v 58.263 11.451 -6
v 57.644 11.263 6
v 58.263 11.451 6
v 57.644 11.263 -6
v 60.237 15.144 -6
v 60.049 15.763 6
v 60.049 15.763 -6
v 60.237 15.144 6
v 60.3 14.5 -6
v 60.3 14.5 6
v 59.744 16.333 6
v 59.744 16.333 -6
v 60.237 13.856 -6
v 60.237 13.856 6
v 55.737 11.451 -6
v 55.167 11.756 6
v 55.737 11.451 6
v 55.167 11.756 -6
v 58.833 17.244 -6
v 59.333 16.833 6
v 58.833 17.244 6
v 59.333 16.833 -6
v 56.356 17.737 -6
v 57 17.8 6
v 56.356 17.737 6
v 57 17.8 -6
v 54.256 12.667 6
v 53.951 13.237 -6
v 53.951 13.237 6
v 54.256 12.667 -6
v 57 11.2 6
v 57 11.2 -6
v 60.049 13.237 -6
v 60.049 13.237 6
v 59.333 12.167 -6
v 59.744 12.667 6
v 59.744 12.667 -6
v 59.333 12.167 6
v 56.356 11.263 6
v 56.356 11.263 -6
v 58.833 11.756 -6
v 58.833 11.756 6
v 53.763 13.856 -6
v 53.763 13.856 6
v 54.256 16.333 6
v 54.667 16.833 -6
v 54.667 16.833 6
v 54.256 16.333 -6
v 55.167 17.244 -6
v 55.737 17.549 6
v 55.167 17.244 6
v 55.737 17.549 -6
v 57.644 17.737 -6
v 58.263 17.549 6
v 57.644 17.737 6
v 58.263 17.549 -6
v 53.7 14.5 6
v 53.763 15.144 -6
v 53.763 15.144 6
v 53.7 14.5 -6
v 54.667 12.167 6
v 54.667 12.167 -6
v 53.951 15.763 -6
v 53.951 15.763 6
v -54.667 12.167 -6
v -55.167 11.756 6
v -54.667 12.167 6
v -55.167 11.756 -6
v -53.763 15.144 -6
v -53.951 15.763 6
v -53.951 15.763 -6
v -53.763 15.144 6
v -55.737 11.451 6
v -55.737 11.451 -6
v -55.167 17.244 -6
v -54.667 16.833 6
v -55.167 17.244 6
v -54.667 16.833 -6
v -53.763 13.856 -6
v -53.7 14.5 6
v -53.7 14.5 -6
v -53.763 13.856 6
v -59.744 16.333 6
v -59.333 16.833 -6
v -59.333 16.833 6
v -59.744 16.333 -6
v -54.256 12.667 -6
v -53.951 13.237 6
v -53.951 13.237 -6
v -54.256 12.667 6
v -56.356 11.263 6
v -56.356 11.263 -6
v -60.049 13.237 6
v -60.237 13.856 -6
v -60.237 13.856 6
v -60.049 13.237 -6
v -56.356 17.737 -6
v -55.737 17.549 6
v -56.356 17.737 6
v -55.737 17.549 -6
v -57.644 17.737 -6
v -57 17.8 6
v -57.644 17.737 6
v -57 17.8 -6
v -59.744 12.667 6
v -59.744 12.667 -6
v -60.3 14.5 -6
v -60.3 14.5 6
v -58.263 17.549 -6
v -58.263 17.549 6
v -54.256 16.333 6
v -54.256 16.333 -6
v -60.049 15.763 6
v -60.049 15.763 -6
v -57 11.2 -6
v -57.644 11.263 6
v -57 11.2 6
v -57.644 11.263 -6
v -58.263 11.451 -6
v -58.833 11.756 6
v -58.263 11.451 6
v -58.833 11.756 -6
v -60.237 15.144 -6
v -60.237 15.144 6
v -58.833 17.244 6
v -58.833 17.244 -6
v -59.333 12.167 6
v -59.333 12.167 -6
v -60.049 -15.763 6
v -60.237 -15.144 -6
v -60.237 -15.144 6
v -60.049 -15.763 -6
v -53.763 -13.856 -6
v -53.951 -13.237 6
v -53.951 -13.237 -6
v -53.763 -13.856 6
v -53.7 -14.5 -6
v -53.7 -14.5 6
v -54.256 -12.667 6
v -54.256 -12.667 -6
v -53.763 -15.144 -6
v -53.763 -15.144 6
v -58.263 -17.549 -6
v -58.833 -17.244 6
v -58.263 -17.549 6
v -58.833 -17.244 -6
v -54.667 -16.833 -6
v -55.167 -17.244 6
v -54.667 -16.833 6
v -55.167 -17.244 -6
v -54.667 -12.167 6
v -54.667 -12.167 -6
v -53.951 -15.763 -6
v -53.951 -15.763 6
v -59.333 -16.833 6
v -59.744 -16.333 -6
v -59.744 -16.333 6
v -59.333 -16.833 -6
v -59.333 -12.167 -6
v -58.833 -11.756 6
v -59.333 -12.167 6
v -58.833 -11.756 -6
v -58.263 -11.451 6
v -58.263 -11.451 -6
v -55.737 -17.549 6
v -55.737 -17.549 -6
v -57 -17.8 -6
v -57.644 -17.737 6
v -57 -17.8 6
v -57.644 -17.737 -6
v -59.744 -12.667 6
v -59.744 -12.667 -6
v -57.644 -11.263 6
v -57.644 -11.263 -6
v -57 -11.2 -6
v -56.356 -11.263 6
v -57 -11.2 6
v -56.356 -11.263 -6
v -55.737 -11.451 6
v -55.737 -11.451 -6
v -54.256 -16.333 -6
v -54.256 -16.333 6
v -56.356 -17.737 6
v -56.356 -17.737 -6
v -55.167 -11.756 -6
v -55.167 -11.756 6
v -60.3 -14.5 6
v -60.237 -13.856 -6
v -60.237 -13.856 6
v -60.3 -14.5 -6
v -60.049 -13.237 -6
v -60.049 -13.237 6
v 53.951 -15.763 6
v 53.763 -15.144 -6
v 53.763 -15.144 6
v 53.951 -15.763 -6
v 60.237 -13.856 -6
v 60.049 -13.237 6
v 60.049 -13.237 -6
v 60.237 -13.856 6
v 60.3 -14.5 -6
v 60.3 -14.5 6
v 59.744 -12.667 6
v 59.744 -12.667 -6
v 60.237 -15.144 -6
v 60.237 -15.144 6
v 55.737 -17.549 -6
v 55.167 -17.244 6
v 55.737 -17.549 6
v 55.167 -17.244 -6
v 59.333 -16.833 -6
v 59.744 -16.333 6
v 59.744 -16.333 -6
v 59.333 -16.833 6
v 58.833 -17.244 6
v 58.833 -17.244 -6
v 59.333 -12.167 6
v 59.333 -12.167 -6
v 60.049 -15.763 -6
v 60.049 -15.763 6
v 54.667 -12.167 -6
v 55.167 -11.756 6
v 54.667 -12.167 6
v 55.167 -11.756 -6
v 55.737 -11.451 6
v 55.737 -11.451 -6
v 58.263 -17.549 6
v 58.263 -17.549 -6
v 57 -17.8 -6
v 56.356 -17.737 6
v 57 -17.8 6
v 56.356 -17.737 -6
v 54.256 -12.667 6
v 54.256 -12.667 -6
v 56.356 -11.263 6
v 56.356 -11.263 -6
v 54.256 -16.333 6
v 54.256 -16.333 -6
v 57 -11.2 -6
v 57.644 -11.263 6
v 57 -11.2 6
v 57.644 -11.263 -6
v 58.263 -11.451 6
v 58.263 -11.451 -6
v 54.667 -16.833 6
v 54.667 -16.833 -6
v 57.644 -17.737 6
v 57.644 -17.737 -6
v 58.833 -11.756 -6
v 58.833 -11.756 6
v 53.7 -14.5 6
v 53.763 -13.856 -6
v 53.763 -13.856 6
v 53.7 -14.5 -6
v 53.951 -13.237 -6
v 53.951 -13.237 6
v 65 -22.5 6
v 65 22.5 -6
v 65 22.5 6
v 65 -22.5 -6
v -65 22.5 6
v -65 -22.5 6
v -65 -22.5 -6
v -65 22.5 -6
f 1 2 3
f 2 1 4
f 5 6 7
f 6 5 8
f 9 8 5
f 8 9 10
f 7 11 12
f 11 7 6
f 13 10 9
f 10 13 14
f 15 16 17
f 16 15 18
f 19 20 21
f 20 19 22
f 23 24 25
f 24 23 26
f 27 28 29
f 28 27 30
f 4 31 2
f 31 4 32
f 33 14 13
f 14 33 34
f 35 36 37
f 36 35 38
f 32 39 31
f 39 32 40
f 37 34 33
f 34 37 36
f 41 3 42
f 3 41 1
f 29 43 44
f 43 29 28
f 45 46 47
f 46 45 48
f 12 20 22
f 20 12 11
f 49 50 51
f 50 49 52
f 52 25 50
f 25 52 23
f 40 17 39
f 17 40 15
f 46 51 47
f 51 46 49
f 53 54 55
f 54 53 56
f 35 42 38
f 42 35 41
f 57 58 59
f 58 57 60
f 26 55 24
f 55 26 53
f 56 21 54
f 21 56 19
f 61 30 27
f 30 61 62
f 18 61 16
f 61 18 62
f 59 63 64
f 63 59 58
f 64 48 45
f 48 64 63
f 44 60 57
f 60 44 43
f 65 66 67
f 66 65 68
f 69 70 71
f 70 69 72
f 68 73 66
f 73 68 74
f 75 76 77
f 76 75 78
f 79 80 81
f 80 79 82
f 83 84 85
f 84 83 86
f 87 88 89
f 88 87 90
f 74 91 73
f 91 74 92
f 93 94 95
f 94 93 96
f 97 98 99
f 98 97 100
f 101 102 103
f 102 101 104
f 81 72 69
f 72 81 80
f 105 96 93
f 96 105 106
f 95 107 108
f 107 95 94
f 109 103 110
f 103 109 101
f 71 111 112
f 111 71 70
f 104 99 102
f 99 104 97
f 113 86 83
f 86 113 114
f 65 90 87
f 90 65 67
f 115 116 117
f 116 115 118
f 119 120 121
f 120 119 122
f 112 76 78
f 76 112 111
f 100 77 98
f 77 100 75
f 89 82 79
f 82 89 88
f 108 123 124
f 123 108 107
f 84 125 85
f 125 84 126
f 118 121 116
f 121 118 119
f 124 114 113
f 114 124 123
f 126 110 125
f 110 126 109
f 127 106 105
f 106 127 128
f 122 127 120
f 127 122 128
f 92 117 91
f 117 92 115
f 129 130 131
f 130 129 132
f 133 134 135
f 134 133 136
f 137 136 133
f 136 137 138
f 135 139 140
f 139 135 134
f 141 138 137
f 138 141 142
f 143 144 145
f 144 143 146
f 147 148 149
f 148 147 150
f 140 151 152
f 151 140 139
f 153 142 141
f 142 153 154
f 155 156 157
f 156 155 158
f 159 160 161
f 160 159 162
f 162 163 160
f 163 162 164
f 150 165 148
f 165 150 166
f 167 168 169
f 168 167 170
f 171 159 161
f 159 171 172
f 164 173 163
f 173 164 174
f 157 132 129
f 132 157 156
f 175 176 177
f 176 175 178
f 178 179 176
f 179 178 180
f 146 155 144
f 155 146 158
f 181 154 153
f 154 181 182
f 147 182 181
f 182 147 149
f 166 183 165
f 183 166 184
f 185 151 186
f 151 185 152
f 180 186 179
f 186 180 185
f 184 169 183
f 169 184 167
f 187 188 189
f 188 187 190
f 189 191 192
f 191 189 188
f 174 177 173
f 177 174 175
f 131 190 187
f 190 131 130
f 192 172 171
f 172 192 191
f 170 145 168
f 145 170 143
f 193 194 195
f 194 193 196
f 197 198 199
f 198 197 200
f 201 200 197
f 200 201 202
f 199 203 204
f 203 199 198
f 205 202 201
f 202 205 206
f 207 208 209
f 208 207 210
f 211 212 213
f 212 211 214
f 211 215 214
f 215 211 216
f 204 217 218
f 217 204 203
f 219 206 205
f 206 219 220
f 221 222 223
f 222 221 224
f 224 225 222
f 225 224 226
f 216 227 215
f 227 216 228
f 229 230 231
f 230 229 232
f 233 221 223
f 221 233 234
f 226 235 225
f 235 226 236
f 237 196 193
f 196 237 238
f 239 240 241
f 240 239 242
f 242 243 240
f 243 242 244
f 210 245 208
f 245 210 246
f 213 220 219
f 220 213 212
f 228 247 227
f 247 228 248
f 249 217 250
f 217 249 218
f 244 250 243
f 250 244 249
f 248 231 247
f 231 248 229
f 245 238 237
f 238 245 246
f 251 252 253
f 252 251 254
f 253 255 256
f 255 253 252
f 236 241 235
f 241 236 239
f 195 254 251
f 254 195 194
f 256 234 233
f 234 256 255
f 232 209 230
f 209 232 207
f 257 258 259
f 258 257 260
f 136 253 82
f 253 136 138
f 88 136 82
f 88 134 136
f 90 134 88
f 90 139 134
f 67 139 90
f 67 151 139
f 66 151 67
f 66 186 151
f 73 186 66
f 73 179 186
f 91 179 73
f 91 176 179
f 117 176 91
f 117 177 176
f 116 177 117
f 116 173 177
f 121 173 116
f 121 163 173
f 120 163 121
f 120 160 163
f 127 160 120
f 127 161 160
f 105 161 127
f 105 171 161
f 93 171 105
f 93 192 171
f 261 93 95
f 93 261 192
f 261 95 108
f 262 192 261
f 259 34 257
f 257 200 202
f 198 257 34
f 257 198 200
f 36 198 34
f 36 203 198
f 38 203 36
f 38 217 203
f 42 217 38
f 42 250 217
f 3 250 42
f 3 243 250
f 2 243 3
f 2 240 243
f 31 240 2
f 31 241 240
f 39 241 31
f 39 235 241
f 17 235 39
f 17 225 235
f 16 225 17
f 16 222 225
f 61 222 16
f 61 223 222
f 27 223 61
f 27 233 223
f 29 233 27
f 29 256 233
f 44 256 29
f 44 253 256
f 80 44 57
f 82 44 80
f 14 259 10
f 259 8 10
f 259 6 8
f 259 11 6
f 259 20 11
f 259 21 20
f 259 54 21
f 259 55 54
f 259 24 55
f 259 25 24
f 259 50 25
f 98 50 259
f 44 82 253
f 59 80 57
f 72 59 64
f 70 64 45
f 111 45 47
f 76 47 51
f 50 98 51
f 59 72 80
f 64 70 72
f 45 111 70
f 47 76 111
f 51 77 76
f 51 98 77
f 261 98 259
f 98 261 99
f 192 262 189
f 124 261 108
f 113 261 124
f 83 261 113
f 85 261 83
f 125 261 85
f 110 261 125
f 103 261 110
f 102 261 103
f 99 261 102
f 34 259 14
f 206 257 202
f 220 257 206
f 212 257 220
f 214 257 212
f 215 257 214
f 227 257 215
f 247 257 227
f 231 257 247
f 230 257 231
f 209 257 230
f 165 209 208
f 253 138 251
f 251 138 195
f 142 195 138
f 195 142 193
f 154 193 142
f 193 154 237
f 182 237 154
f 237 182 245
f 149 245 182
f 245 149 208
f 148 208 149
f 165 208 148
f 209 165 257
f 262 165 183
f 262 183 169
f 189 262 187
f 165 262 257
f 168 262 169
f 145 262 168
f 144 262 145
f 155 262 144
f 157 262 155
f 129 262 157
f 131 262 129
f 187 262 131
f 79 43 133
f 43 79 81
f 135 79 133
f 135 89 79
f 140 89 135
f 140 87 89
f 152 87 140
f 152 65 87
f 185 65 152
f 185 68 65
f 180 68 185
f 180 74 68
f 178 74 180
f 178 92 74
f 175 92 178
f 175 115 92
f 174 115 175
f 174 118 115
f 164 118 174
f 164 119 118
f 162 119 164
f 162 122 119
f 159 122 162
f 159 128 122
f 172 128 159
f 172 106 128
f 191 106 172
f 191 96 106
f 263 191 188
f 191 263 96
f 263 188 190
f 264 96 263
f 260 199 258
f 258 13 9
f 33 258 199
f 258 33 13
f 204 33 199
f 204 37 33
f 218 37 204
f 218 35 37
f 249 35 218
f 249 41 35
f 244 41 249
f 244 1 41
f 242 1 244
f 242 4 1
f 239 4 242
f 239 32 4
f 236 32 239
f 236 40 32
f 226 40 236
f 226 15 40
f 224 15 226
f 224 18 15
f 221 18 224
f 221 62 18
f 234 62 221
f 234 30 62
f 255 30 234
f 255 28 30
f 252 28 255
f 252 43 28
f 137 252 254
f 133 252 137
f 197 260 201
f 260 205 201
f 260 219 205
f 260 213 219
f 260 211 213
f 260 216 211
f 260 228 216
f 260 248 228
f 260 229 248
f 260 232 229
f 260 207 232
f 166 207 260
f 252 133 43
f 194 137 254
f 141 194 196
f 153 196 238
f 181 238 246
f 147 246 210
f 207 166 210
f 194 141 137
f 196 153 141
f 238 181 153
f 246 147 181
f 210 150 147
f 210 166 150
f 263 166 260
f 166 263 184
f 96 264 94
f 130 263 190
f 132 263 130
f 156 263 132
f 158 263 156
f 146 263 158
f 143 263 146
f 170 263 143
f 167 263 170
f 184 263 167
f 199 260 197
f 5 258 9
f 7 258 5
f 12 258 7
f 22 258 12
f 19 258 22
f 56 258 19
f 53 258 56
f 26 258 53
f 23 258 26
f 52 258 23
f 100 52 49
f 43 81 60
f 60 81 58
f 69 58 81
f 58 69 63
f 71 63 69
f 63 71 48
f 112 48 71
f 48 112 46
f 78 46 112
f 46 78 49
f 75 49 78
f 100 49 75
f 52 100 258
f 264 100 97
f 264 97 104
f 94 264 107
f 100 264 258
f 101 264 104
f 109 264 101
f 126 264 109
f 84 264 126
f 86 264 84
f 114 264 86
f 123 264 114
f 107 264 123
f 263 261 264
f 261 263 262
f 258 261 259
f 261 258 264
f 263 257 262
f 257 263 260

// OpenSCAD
$fn = 32;

// ----------------------------------------------------------------------
// Corner plate 130 x 45 x 12
// 4 holes, centres taken from the edge offset
// ----------------------------------------------------------------------

// --- parameters (mm) ---
plate = [130, 45, 12];  // overall size (x, y, z)
holes = 4;              // number of holes the drawing asks for
hole_d = 6.6;           // hole diameter
edge = 8;               // hole centre offset from the plate edge

// --- derived feature positions (mm) ---
corner_x = plate[0] / 2 - edge;  // = 57   corner hole X
corner_y = plate[1] / 2 - edge;  // = 14.5   corner hole Y
feature_centers = [
  [corner_x, corner_y],
  [-corner_x, corner_y],
  [-corner_x, -corner_y],
  [corner_x, -corner_y]
];   // hole centres the loop below drills

// plate outline, every hole drilled through with the same cutters
difference() {
  cube(plate, center = true);
  for (centre = feature_centers)
    translate([centre[0], centre[1], 0])
      cylinder(d = hole_d, h = plate[2] + 2, center = true);
}
